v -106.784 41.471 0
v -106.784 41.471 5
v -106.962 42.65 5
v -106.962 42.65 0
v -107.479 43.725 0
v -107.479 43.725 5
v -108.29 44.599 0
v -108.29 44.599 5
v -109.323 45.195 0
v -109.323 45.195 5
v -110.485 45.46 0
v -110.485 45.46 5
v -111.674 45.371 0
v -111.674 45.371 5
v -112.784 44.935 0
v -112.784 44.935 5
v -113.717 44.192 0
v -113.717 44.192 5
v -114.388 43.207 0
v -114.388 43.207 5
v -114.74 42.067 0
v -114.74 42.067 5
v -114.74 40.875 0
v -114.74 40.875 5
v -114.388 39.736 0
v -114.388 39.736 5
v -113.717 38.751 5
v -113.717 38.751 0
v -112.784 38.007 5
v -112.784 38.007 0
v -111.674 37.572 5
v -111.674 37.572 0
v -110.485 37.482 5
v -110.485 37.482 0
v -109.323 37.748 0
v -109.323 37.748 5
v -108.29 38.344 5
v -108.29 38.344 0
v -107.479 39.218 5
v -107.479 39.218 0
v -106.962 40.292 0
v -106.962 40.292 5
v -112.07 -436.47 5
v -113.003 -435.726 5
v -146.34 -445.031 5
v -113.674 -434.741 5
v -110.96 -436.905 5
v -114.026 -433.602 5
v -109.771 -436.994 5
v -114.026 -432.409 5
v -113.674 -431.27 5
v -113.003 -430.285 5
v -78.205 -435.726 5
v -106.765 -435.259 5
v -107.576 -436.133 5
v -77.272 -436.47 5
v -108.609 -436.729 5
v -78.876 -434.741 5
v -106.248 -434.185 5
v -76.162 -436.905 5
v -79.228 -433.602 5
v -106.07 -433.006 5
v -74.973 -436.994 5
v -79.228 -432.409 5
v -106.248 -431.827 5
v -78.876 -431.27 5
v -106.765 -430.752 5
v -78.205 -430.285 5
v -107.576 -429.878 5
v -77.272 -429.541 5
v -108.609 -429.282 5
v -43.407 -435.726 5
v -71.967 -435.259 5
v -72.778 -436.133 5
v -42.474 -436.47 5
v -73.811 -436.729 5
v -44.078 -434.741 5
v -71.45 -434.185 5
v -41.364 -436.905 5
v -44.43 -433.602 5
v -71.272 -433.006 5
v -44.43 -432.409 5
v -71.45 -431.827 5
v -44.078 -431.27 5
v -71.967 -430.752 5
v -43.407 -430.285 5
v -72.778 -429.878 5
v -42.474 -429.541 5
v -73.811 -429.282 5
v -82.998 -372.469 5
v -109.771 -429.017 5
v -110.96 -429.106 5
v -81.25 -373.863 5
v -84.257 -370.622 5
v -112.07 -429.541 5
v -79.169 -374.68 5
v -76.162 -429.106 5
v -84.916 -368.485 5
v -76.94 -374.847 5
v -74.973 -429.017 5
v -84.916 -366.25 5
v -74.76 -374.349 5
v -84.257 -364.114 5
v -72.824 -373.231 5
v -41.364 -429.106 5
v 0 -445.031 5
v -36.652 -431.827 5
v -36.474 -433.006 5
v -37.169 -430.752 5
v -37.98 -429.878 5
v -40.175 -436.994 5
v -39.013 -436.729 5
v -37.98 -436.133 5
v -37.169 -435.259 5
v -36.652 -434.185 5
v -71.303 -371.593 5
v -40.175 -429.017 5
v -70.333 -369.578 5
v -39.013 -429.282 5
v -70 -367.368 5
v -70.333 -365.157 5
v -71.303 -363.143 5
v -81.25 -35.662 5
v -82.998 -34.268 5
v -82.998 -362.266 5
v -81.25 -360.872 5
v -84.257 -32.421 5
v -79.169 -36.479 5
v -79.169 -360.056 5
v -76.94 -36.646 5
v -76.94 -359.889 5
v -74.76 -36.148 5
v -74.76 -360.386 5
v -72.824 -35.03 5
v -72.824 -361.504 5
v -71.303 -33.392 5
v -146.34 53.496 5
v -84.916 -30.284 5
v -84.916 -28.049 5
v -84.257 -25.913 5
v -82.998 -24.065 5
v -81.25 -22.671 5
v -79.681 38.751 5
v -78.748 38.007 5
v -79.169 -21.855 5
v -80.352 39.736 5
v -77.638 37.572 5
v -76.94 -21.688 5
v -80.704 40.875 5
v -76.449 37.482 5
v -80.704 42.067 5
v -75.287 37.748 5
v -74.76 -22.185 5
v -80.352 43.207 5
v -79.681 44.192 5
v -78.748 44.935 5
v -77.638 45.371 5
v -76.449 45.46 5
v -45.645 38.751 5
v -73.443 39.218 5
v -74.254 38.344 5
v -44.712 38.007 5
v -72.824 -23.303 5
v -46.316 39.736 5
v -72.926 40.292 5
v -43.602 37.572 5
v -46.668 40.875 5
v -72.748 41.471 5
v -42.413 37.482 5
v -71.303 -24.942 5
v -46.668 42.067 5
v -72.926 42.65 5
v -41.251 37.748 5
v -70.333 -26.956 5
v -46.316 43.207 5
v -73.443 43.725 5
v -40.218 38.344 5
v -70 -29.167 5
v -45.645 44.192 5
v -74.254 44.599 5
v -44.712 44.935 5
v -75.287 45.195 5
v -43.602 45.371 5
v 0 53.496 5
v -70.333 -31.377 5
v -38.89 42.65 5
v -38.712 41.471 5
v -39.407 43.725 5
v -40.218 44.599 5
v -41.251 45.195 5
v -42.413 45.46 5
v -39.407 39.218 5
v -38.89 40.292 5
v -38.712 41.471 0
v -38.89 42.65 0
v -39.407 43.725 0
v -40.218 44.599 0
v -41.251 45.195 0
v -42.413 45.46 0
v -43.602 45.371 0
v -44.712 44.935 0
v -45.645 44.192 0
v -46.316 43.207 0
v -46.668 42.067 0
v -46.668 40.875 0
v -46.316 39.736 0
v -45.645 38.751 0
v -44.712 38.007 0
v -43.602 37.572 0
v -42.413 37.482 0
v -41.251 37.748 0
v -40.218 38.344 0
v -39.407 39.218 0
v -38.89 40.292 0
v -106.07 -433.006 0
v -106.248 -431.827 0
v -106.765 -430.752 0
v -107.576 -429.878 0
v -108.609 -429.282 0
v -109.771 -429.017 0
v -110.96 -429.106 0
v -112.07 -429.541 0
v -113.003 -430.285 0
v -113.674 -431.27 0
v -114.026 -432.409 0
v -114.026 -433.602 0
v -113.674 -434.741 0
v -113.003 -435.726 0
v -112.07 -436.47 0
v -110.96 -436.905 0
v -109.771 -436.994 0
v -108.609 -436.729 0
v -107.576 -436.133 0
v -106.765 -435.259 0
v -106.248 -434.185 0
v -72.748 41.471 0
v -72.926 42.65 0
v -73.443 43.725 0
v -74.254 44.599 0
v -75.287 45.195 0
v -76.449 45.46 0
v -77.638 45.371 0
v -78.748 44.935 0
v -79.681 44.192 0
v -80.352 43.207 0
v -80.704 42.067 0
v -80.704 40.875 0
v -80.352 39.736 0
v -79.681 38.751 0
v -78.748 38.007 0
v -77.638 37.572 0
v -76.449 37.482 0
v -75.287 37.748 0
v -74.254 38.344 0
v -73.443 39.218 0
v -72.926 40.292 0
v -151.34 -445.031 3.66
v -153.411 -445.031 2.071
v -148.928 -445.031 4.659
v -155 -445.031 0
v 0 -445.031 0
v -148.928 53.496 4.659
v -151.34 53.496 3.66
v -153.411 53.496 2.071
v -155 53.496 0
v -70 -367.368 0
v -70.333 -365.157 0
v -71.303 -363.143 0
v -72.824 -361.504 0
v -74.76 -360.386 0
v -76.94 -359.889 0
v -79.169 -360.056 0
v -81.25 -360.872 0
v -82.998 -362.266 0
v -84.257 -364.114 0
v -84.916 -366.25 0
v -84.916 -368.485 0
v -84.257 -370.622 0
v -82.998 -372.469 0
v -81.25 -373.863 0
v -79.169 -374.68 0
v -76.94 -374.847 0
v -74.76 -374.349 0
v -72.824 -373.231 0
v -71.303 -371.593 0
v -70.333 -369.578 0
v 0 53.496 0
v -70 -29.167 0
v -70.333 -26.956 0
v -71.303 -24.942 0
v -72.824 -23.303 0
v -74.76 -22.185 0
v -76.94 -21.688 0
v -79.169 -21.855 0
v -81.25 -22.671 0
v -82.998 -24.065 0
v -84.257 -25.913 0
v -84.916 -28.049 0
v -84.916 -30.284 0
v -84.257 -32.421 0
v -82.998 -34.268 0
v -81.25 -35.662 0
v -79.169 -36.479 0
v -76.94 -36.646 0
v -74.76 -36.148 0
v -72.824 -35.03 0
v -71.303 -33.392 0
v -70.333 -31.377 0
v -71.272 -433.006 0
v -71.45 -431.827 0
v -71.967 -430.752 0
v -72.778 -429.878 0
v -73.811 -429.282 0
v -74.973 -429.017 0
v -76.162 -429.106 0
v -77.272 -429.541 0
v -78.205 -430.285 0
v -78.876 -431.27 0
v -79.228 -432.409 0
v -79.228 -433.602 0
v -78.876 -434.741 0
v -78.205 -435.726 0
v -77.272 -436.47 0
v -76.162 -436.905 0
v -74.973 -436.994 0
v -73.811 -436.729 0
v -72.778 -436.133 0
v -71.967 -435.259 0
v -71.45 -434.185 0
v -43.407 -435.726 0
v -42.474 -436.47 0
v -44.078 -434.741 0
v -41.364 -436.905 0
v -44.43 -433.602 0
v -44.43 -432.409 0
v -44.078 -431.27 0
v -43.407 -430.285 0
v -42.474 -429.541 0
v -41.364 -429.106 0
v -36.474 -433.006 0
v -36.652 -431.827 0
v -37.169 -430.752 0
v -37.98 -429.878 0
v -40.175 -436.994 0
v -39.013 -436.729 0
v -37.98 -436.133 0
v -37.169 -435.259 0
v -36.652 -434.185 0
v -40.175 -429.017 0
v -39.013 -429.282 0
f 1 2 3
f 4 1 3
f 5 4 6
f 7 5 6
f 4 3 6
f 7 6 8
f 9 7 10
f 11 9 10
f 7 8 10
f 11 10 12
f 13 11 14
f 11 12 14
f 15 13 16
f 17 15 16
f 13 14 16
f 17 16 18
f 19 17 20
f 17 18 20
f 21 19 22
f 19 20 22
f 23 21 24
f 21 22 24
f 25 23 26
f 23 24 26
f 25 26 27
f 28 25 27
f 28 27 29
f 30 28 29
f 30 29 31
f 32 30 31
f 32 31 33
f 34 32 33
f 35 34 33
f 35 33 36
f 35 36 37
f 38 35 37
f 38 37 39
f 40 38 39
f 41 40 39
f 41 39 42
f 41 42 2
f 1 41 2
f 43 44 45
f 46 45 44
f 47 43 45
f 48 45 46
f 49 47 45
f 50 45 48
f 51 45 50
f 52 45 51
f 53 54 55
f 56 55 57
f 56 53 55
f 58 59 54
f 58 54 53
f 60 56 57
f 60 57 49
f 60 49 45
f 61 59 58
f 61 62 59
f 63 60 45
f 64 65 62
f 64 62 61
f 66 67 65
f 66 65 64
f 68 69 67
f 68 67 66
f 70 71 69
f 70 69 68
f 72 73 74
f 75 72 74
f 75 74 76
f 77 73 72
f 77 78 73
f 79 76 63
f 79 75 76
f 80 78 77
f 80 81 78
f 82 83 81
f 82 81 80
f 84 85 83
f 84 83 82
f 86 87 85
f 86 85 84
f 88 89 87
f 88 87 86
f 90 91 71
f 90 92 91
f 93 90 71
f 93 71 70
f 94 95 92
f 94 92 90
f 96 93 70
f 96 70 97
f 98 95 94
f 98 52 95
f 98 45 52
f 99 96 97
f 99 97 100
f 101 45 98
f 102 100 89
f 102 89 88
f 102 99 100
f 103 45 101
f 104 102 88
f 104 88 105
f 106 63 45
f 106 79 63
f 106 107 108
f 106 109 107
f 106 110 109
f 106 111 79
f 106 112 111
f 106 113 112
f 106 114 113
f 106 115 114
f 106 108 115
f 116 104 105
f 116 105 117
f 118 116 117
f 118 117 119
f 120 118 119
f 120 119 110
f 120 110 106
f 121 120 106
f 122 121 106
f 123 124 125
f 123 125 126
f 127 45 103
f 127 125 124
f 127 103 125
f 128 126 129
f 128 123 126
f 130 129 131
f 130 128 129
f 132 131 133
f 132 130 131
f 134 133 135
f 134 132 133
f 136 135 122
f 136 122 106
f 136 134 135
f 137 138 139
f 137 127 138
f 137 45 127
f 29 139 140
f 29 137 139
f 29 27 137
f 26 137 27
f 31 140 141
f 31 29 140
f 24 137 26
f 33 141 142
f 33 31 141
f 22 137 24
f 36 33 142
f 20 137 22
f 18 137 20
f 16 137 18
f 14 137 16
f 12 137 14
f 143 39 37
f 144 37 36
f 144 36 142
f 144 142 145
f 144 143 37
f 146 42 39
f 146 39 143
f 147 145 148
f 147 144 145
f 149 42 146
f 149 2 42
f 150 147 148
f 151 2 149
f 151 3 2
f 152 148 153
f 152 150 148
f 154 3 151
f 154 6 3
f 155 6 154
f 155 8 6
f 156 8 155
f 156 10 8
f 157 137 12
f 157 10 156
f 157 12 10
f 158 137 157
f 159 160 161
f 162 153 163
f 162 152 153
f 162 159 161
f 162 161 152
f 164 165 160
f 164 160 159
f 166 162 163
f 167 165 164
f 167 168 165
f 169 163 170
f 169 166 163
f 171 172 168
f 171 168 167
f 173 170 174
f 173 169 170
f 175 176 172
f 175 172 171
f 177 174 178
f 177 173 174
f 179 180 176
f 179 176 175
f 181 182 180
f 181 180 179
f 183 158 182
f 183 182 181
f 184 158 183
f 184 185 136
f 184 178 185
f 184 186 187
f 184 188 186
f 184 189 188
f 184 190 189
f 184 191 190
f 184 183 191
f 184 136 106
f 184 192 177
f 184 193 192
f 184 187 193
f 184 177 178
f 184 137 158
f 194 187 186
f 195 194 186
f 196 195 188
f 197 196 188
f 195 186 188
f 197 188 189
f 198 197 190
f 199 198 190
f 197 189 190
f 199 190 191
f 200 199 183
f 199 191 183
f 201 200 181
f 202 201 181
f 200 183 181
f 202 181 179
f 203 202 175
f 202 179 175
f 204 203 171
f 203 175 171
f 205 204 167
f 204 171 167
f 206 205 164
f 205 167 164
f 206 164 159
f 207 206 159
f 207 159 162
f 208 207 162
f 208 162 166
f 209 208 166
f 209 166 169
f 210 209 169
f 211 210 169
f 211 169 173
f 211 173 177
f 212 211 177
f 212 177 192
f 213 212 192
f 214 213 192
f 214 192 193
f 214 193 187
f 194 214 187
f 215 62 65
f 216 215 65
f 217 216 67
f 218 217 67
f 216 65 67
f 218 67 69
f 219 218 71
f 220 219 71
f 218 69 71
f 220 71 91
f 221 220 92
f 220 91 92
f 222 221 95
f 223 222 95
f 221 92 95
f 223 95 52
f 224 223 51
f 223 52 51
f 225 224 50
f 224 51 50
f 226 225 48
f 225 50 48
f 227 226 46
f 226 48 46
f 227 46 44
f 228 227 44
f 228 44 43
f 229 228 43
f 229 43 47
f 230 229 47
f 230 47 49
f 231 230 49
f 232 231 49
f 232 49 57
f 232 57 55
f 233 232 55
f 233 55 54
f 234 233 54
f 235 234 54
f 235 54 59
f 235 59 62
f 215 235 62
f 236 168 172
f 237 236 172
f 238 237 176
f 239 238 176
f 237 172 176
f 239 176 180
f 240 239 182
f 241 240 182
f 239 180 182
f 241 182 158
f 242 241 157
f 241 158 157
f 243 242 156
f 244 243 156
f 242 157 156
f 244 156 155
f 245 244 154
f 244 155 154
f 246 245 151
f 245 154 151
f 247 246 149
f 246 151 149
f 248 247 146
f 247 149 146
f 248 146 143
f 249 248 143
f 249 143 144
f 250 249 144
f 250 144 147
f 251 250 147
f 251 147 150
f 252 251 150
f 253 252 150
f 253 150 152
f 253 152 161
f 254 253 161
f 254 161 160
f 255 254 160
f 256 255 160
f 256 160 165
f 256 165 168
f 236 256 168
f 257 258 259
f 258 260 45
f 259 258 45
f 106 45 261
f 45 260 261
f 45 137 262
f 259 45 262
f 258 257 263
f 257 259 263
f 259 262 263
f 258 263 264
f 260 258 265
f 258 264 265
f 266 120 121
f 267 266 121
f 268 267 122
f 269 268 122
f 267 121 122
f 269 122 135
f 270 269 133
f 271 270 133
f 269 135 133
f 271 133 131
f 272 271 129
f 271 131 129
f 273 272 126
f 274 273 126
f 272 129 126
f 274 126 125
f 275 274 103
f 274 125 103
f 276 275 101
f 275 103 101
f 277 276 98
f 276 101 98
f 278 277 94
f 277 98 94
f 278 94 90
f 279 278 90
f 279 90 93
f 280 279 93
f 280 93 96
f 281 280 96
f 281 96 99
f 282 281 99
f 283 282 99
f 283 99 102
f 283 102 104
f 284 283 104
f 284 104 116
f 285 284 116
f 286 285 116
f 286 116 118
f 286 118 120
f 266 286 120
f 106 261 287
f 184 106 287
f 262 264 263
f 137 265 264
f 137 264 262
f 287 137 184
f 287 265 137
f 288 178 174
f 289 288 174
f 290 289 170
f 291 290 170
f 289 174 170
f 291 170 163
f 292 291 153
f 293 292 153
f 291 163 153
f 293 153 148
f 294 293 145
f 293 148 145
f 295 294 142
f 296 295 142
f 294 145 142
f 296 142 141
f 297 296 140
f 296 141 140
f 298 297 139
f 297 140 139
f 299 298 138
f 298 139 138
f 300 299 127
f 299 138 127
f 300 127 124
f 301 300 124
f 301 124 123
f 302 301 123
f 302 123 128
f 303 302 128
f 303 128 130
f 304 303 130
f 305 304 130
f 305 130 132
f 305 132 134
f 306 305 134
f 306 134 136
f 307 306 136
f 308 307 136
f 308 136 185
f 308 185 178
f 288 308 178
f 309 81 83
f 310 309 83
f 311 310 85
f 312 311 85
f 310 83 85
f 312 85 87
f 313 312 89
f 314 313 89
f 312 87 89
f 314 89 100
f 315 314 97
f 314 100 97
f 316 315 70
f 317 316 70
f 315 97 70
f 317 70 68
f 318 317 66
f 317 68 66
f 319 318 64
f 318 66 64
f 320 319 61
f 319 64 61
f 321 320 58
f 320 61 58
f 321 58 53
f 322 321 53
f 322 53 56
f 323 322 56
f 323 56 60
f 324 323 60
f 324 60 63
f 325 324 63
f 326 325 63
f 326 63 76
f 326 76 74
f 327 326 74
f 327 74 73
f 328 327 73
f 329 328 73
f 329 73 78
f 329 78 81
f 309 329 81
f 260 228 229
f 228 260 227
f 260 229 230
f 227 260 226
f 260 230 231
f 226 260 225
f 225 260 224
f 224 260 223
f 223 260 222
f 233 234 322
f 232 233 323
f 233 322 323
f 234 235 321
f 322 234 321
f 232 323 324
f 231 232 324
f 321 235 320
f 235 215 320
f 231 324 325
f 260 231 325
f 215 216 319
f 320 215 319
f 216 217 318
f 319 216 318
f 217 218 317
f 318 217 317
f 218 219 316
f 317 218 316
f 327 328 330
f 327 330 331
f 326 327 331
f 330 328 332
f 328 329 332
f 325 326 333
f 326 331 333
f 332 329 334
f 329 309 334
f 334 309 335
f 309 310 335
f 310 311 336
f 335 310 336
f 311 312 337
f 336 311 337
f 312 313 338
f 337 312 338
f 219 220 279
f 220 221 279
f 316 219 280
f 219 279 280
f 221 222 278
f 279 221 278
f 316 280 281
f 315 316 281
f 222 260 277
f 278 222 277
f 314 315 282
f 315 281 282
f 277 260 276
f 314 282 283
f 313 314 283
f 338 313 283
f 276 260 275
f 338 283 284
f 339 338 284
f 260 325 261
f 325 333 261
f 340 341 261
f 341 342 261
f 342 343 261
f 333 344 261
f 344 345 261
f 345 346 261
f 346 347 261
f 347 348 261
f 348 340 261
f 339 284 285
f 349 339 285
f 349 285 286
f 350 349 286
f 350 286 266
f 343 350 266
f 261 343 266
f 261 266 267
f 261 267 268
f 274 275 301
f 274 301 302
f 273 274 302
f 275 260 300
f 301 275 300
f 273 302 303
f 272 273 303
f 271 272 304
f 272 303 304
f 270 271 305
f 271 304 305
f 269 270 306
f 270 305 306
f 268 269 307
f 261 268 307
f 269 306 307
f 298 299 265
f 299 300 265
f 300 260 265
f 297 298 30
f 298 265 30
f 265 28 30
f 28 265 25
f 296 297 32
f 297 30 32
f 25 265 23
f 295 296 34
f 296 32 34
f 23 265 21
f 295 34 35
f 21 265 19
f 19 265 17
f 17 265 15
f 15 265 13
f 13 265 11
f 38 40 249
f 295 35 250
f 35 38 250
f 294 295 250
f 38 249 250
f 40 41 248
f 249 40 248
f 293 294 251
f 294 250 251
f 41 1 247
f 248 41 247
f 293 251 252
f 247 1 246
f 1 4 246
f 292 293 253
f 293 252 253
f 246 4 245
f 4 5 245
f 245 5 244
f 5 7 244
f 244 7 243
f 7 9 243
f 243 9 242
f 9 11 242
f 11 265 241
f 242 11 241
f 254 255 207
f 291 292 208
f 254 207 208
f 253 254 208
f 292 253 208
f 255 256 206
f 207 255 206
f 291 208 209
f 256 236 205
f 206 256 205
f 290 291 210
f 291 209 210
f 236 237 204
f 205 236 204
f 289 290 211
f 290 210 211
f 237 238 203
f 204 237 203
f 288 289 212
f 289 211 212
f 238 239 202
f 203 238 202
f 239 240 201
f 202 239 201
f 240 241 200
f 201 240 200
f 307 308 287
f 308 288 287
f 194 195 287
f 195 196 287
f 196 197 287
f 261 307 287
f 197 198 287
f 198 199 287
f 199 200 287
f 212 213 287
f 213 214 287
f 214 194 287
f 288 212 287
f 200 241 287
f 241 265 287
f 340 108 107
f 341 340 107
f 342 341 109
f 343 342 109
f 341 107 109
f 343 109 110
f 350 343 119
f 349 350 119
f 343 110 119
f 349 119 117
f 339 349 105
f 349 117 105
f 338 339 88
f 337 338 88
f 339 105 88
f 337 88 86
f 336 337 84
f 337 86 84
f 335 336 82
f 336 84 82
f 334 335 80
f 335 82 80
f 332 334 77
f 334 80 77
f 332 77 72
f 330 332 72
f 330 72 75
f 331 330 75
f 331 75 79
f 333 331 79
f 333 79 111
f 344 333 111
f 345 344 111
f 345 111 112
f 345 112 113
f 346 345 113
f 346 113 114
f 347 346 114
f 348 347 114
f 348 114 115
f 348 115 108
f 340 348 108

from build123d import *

# Parameters (mm, degrees)
SKETCH1_W          = 155
SKETCH1_H          = 498.5268
BASE_FLANGE1_DEPTH = 5
CUT_EXTRUDE2_REACH = 473.277
SKETCH6_R          = 7.5
CUT_EXTRUDE3_REACH = 473.277
SKETCH7_R          = 4
FILLET1_R          = 10


# Sheet-metal steps are written as plain solids
with BuildPart() as part:
    # Sketch1 → Base-Flange1 (new body)
    with BuildSketch(Plane.XY):
        with Locations((-77.5, -195.767163373)):
            Rectangle(SKETCH1_W, SKETCH1_H)
    extrude(amount=BASE_FLANGE1_DEPTH)

    # Sketch6 → Cut-Extrude2 (cut, up to next)
    with BuildSketch(Plane.XY.offset(5), mode=Mode.PRIVATE) as cut_extrude2_sk1:
        with Locations((-77.5, -367.367664241)):
            Circle(SKETCH6_R)
    cut_extrude2_tool1 = extrude(cut_extrude2_sk1.sketch, amount=-CUT_EXTRUDE2_REACH, mode=Mode.PRIVATE) & part.part
    # Sketch6 → Cut-Extrude2 (cut, up to next)
    with BuildSketch(Plane.XY.offset(5), mode=Mode.PRIVATE) as cut_extrude2_sk2:
        with Locations((-77.5, -29.166662504)):
            Circle(SKETCH6_R)
    cut_extrude2_tool2 = extrude(cut_extrude2_sk2.sketch, amount=-CUT_EXTRUDE2_REACH, mode=Mode.PRIVATE) & part.part
    add(cut_extrude2_tool1.solids().sort_by_distance((-77.5, -367.367664, 5))[0], mode=Mode.SUBTRACT)
    add(cut_extrude2_tool2.solids().sort_by_distance((-77.5, -29.166663, 5))[0], mode=Mode.SUBTRACT)

    # Sketch7 → Cut-Extrude3 (cut, up to next)
    with BuildSketch(Plane.XY.offset(5), mode=Mode.PRIVATE) as cut_extrude3_sk1:
        with Locations((-110.070394878, -433.005563373)):
            Circle(SKETCH7_R)
    cut_extrude3_tool1 = extrude(cut_extrude3_sk1.sketch, amount=-CUT_EXTRUDE3_REACH, mode=Mode.PRIVATE) & part.part
    # Sketch7 → Cut-Extrude3 (cut, up to next)
    with BuildSketch(Plane.XY.offset(5), mode=Mode.PRIVATE) as cut_extrude3_sk2:
        with Locations((-75.272394878, -433.005563373)):
            Circle(SKETCH7_R)
    cut_extrude3_tool2 = extrude(cut_extrude3_sk2.sketch, amount=-CUT_EXTRUDE3_REACH, mode=Mode.PRIVATE) & part.part
    # Sketch7 → Cut-Extrude3 (cut, up to next)
    with BuildSketch(Plane.XY.offset(5), mode=Mode.PRIVATE) as cut_extrude3_sk3:
        with Locations((-40.474394878, -433.005563373)):
            Circle(SKETCH7_R)
    cut_extrude3_tool3 = extrude(cut_extrude3_sk3.sketch, amount=-CUT_EXTRUDE3_REACH, mode=Mode.PRIVATE) & part.part
    # Sketch7 → Cut-Extrude3 (cut, up to next)
    with BuildSketch(Plane.XY.offset(5), mode=Mode.PRIVATE) as cut_extrude3_sk4:
        with Locations((-42.712394878, 41.471236627)):
            Circle(SKETCH7_R)
    cut_extrude3_tool4 = extrude(cut_extrude3_sk4.sketch, amount=-CUT_EXTRUDE3_REACH, mode=Mode.PRIVATE) & part.part
    # Sketch7 → Cut-Extrude3 (cut, up to next)
    with BuildSketch(Plane.XY.offset(5), mode=Mode.PRIVATE) as cut_extrude3_sk5:
        with Locations((-76.748394878, 41.471236627)):
            Circle(SKETCH7_R)
    cut_extrude3_tool5 = extrude(cut_extrude3_sk5.sketch, amount=-CUT_EXTRUDE3_REACH, mode=Mode.PRIVATE) & part.part
    # Sketch7 → Cut-Extrude3 (cut, up to next)
    with BuildSketch(Plane.XY.offset(5), mode=Mode.PRIVATE) as cut_extrude3_sk6:
        with Locations((-110.784394878, 41.471236627)):
            Circle(SKETCH7_R)
    cut_extrude3_tool6 = extrude(cut_extrude3_sk6.sketch, amount=-CUT_EXTRUDE3_REACH, mode=Mode.PRIVATE) & part.part
    add(cut_extrude3_tool1.solids().sort_by_distance((-110.070395, -433.005563, 5))[0], mode=Mode.SUBTRACT)
    add(cut_extrude3_tool2.solids().sort_by_distance((-75.272395, -433.005563, 5))[0], mode=Mode.SUBTRACT)
    add(cut_extrude3_tool3.solids().sort_by_distance((-40.474395, -433.005563, 5))[0], mode=Mode.SUBTRACT)
    add(cut_extrude3_tool4.solids().sort_by_distance((-42.712395, 41.471237, 5))[0], mode=Mode.SUBTRACT)
    add(cut_extrude3_tool5.solids().sort_by_distance((-76.748395, 41.471237, 5))[0], mode=Mode.SUBTRACT)
    add(cut_extrude3_tool6.solids().sort_by_distance((-110.784395, 41.471237, 5))[0], mode=Mode.SUBTRACT)

    # Fillet1
    # the kernel refuses this fillet: 10 mm, written as the material it takes off along each edge
    with BuildSketch(Plane(origin=(-155, 75.146871722, 5), x_dir=(0, 0, -1), z_dir=(0, -1, 0))) as fillet1_piece_1:
        with BuildLine():
            CenterArc((10, 8.660254038), FILLET1_R, 180, 60)
            Line((0, 8.660254038), (-0.2, 8.660254038))
            Line((-0.2, 8.660254038), (-0.2, 0))
            Line((-0.2, 0), (0, -0.2))
            ThreePointArc((0, -0.2), (2.5, -0.2), (4.9, -0.173205081))
            Line((4.9, -0.173205081), (5, 0))
        make_face()
    extrude(amount=541.828070189, mode=Mode.SUBTRACT)


solid = part.part
